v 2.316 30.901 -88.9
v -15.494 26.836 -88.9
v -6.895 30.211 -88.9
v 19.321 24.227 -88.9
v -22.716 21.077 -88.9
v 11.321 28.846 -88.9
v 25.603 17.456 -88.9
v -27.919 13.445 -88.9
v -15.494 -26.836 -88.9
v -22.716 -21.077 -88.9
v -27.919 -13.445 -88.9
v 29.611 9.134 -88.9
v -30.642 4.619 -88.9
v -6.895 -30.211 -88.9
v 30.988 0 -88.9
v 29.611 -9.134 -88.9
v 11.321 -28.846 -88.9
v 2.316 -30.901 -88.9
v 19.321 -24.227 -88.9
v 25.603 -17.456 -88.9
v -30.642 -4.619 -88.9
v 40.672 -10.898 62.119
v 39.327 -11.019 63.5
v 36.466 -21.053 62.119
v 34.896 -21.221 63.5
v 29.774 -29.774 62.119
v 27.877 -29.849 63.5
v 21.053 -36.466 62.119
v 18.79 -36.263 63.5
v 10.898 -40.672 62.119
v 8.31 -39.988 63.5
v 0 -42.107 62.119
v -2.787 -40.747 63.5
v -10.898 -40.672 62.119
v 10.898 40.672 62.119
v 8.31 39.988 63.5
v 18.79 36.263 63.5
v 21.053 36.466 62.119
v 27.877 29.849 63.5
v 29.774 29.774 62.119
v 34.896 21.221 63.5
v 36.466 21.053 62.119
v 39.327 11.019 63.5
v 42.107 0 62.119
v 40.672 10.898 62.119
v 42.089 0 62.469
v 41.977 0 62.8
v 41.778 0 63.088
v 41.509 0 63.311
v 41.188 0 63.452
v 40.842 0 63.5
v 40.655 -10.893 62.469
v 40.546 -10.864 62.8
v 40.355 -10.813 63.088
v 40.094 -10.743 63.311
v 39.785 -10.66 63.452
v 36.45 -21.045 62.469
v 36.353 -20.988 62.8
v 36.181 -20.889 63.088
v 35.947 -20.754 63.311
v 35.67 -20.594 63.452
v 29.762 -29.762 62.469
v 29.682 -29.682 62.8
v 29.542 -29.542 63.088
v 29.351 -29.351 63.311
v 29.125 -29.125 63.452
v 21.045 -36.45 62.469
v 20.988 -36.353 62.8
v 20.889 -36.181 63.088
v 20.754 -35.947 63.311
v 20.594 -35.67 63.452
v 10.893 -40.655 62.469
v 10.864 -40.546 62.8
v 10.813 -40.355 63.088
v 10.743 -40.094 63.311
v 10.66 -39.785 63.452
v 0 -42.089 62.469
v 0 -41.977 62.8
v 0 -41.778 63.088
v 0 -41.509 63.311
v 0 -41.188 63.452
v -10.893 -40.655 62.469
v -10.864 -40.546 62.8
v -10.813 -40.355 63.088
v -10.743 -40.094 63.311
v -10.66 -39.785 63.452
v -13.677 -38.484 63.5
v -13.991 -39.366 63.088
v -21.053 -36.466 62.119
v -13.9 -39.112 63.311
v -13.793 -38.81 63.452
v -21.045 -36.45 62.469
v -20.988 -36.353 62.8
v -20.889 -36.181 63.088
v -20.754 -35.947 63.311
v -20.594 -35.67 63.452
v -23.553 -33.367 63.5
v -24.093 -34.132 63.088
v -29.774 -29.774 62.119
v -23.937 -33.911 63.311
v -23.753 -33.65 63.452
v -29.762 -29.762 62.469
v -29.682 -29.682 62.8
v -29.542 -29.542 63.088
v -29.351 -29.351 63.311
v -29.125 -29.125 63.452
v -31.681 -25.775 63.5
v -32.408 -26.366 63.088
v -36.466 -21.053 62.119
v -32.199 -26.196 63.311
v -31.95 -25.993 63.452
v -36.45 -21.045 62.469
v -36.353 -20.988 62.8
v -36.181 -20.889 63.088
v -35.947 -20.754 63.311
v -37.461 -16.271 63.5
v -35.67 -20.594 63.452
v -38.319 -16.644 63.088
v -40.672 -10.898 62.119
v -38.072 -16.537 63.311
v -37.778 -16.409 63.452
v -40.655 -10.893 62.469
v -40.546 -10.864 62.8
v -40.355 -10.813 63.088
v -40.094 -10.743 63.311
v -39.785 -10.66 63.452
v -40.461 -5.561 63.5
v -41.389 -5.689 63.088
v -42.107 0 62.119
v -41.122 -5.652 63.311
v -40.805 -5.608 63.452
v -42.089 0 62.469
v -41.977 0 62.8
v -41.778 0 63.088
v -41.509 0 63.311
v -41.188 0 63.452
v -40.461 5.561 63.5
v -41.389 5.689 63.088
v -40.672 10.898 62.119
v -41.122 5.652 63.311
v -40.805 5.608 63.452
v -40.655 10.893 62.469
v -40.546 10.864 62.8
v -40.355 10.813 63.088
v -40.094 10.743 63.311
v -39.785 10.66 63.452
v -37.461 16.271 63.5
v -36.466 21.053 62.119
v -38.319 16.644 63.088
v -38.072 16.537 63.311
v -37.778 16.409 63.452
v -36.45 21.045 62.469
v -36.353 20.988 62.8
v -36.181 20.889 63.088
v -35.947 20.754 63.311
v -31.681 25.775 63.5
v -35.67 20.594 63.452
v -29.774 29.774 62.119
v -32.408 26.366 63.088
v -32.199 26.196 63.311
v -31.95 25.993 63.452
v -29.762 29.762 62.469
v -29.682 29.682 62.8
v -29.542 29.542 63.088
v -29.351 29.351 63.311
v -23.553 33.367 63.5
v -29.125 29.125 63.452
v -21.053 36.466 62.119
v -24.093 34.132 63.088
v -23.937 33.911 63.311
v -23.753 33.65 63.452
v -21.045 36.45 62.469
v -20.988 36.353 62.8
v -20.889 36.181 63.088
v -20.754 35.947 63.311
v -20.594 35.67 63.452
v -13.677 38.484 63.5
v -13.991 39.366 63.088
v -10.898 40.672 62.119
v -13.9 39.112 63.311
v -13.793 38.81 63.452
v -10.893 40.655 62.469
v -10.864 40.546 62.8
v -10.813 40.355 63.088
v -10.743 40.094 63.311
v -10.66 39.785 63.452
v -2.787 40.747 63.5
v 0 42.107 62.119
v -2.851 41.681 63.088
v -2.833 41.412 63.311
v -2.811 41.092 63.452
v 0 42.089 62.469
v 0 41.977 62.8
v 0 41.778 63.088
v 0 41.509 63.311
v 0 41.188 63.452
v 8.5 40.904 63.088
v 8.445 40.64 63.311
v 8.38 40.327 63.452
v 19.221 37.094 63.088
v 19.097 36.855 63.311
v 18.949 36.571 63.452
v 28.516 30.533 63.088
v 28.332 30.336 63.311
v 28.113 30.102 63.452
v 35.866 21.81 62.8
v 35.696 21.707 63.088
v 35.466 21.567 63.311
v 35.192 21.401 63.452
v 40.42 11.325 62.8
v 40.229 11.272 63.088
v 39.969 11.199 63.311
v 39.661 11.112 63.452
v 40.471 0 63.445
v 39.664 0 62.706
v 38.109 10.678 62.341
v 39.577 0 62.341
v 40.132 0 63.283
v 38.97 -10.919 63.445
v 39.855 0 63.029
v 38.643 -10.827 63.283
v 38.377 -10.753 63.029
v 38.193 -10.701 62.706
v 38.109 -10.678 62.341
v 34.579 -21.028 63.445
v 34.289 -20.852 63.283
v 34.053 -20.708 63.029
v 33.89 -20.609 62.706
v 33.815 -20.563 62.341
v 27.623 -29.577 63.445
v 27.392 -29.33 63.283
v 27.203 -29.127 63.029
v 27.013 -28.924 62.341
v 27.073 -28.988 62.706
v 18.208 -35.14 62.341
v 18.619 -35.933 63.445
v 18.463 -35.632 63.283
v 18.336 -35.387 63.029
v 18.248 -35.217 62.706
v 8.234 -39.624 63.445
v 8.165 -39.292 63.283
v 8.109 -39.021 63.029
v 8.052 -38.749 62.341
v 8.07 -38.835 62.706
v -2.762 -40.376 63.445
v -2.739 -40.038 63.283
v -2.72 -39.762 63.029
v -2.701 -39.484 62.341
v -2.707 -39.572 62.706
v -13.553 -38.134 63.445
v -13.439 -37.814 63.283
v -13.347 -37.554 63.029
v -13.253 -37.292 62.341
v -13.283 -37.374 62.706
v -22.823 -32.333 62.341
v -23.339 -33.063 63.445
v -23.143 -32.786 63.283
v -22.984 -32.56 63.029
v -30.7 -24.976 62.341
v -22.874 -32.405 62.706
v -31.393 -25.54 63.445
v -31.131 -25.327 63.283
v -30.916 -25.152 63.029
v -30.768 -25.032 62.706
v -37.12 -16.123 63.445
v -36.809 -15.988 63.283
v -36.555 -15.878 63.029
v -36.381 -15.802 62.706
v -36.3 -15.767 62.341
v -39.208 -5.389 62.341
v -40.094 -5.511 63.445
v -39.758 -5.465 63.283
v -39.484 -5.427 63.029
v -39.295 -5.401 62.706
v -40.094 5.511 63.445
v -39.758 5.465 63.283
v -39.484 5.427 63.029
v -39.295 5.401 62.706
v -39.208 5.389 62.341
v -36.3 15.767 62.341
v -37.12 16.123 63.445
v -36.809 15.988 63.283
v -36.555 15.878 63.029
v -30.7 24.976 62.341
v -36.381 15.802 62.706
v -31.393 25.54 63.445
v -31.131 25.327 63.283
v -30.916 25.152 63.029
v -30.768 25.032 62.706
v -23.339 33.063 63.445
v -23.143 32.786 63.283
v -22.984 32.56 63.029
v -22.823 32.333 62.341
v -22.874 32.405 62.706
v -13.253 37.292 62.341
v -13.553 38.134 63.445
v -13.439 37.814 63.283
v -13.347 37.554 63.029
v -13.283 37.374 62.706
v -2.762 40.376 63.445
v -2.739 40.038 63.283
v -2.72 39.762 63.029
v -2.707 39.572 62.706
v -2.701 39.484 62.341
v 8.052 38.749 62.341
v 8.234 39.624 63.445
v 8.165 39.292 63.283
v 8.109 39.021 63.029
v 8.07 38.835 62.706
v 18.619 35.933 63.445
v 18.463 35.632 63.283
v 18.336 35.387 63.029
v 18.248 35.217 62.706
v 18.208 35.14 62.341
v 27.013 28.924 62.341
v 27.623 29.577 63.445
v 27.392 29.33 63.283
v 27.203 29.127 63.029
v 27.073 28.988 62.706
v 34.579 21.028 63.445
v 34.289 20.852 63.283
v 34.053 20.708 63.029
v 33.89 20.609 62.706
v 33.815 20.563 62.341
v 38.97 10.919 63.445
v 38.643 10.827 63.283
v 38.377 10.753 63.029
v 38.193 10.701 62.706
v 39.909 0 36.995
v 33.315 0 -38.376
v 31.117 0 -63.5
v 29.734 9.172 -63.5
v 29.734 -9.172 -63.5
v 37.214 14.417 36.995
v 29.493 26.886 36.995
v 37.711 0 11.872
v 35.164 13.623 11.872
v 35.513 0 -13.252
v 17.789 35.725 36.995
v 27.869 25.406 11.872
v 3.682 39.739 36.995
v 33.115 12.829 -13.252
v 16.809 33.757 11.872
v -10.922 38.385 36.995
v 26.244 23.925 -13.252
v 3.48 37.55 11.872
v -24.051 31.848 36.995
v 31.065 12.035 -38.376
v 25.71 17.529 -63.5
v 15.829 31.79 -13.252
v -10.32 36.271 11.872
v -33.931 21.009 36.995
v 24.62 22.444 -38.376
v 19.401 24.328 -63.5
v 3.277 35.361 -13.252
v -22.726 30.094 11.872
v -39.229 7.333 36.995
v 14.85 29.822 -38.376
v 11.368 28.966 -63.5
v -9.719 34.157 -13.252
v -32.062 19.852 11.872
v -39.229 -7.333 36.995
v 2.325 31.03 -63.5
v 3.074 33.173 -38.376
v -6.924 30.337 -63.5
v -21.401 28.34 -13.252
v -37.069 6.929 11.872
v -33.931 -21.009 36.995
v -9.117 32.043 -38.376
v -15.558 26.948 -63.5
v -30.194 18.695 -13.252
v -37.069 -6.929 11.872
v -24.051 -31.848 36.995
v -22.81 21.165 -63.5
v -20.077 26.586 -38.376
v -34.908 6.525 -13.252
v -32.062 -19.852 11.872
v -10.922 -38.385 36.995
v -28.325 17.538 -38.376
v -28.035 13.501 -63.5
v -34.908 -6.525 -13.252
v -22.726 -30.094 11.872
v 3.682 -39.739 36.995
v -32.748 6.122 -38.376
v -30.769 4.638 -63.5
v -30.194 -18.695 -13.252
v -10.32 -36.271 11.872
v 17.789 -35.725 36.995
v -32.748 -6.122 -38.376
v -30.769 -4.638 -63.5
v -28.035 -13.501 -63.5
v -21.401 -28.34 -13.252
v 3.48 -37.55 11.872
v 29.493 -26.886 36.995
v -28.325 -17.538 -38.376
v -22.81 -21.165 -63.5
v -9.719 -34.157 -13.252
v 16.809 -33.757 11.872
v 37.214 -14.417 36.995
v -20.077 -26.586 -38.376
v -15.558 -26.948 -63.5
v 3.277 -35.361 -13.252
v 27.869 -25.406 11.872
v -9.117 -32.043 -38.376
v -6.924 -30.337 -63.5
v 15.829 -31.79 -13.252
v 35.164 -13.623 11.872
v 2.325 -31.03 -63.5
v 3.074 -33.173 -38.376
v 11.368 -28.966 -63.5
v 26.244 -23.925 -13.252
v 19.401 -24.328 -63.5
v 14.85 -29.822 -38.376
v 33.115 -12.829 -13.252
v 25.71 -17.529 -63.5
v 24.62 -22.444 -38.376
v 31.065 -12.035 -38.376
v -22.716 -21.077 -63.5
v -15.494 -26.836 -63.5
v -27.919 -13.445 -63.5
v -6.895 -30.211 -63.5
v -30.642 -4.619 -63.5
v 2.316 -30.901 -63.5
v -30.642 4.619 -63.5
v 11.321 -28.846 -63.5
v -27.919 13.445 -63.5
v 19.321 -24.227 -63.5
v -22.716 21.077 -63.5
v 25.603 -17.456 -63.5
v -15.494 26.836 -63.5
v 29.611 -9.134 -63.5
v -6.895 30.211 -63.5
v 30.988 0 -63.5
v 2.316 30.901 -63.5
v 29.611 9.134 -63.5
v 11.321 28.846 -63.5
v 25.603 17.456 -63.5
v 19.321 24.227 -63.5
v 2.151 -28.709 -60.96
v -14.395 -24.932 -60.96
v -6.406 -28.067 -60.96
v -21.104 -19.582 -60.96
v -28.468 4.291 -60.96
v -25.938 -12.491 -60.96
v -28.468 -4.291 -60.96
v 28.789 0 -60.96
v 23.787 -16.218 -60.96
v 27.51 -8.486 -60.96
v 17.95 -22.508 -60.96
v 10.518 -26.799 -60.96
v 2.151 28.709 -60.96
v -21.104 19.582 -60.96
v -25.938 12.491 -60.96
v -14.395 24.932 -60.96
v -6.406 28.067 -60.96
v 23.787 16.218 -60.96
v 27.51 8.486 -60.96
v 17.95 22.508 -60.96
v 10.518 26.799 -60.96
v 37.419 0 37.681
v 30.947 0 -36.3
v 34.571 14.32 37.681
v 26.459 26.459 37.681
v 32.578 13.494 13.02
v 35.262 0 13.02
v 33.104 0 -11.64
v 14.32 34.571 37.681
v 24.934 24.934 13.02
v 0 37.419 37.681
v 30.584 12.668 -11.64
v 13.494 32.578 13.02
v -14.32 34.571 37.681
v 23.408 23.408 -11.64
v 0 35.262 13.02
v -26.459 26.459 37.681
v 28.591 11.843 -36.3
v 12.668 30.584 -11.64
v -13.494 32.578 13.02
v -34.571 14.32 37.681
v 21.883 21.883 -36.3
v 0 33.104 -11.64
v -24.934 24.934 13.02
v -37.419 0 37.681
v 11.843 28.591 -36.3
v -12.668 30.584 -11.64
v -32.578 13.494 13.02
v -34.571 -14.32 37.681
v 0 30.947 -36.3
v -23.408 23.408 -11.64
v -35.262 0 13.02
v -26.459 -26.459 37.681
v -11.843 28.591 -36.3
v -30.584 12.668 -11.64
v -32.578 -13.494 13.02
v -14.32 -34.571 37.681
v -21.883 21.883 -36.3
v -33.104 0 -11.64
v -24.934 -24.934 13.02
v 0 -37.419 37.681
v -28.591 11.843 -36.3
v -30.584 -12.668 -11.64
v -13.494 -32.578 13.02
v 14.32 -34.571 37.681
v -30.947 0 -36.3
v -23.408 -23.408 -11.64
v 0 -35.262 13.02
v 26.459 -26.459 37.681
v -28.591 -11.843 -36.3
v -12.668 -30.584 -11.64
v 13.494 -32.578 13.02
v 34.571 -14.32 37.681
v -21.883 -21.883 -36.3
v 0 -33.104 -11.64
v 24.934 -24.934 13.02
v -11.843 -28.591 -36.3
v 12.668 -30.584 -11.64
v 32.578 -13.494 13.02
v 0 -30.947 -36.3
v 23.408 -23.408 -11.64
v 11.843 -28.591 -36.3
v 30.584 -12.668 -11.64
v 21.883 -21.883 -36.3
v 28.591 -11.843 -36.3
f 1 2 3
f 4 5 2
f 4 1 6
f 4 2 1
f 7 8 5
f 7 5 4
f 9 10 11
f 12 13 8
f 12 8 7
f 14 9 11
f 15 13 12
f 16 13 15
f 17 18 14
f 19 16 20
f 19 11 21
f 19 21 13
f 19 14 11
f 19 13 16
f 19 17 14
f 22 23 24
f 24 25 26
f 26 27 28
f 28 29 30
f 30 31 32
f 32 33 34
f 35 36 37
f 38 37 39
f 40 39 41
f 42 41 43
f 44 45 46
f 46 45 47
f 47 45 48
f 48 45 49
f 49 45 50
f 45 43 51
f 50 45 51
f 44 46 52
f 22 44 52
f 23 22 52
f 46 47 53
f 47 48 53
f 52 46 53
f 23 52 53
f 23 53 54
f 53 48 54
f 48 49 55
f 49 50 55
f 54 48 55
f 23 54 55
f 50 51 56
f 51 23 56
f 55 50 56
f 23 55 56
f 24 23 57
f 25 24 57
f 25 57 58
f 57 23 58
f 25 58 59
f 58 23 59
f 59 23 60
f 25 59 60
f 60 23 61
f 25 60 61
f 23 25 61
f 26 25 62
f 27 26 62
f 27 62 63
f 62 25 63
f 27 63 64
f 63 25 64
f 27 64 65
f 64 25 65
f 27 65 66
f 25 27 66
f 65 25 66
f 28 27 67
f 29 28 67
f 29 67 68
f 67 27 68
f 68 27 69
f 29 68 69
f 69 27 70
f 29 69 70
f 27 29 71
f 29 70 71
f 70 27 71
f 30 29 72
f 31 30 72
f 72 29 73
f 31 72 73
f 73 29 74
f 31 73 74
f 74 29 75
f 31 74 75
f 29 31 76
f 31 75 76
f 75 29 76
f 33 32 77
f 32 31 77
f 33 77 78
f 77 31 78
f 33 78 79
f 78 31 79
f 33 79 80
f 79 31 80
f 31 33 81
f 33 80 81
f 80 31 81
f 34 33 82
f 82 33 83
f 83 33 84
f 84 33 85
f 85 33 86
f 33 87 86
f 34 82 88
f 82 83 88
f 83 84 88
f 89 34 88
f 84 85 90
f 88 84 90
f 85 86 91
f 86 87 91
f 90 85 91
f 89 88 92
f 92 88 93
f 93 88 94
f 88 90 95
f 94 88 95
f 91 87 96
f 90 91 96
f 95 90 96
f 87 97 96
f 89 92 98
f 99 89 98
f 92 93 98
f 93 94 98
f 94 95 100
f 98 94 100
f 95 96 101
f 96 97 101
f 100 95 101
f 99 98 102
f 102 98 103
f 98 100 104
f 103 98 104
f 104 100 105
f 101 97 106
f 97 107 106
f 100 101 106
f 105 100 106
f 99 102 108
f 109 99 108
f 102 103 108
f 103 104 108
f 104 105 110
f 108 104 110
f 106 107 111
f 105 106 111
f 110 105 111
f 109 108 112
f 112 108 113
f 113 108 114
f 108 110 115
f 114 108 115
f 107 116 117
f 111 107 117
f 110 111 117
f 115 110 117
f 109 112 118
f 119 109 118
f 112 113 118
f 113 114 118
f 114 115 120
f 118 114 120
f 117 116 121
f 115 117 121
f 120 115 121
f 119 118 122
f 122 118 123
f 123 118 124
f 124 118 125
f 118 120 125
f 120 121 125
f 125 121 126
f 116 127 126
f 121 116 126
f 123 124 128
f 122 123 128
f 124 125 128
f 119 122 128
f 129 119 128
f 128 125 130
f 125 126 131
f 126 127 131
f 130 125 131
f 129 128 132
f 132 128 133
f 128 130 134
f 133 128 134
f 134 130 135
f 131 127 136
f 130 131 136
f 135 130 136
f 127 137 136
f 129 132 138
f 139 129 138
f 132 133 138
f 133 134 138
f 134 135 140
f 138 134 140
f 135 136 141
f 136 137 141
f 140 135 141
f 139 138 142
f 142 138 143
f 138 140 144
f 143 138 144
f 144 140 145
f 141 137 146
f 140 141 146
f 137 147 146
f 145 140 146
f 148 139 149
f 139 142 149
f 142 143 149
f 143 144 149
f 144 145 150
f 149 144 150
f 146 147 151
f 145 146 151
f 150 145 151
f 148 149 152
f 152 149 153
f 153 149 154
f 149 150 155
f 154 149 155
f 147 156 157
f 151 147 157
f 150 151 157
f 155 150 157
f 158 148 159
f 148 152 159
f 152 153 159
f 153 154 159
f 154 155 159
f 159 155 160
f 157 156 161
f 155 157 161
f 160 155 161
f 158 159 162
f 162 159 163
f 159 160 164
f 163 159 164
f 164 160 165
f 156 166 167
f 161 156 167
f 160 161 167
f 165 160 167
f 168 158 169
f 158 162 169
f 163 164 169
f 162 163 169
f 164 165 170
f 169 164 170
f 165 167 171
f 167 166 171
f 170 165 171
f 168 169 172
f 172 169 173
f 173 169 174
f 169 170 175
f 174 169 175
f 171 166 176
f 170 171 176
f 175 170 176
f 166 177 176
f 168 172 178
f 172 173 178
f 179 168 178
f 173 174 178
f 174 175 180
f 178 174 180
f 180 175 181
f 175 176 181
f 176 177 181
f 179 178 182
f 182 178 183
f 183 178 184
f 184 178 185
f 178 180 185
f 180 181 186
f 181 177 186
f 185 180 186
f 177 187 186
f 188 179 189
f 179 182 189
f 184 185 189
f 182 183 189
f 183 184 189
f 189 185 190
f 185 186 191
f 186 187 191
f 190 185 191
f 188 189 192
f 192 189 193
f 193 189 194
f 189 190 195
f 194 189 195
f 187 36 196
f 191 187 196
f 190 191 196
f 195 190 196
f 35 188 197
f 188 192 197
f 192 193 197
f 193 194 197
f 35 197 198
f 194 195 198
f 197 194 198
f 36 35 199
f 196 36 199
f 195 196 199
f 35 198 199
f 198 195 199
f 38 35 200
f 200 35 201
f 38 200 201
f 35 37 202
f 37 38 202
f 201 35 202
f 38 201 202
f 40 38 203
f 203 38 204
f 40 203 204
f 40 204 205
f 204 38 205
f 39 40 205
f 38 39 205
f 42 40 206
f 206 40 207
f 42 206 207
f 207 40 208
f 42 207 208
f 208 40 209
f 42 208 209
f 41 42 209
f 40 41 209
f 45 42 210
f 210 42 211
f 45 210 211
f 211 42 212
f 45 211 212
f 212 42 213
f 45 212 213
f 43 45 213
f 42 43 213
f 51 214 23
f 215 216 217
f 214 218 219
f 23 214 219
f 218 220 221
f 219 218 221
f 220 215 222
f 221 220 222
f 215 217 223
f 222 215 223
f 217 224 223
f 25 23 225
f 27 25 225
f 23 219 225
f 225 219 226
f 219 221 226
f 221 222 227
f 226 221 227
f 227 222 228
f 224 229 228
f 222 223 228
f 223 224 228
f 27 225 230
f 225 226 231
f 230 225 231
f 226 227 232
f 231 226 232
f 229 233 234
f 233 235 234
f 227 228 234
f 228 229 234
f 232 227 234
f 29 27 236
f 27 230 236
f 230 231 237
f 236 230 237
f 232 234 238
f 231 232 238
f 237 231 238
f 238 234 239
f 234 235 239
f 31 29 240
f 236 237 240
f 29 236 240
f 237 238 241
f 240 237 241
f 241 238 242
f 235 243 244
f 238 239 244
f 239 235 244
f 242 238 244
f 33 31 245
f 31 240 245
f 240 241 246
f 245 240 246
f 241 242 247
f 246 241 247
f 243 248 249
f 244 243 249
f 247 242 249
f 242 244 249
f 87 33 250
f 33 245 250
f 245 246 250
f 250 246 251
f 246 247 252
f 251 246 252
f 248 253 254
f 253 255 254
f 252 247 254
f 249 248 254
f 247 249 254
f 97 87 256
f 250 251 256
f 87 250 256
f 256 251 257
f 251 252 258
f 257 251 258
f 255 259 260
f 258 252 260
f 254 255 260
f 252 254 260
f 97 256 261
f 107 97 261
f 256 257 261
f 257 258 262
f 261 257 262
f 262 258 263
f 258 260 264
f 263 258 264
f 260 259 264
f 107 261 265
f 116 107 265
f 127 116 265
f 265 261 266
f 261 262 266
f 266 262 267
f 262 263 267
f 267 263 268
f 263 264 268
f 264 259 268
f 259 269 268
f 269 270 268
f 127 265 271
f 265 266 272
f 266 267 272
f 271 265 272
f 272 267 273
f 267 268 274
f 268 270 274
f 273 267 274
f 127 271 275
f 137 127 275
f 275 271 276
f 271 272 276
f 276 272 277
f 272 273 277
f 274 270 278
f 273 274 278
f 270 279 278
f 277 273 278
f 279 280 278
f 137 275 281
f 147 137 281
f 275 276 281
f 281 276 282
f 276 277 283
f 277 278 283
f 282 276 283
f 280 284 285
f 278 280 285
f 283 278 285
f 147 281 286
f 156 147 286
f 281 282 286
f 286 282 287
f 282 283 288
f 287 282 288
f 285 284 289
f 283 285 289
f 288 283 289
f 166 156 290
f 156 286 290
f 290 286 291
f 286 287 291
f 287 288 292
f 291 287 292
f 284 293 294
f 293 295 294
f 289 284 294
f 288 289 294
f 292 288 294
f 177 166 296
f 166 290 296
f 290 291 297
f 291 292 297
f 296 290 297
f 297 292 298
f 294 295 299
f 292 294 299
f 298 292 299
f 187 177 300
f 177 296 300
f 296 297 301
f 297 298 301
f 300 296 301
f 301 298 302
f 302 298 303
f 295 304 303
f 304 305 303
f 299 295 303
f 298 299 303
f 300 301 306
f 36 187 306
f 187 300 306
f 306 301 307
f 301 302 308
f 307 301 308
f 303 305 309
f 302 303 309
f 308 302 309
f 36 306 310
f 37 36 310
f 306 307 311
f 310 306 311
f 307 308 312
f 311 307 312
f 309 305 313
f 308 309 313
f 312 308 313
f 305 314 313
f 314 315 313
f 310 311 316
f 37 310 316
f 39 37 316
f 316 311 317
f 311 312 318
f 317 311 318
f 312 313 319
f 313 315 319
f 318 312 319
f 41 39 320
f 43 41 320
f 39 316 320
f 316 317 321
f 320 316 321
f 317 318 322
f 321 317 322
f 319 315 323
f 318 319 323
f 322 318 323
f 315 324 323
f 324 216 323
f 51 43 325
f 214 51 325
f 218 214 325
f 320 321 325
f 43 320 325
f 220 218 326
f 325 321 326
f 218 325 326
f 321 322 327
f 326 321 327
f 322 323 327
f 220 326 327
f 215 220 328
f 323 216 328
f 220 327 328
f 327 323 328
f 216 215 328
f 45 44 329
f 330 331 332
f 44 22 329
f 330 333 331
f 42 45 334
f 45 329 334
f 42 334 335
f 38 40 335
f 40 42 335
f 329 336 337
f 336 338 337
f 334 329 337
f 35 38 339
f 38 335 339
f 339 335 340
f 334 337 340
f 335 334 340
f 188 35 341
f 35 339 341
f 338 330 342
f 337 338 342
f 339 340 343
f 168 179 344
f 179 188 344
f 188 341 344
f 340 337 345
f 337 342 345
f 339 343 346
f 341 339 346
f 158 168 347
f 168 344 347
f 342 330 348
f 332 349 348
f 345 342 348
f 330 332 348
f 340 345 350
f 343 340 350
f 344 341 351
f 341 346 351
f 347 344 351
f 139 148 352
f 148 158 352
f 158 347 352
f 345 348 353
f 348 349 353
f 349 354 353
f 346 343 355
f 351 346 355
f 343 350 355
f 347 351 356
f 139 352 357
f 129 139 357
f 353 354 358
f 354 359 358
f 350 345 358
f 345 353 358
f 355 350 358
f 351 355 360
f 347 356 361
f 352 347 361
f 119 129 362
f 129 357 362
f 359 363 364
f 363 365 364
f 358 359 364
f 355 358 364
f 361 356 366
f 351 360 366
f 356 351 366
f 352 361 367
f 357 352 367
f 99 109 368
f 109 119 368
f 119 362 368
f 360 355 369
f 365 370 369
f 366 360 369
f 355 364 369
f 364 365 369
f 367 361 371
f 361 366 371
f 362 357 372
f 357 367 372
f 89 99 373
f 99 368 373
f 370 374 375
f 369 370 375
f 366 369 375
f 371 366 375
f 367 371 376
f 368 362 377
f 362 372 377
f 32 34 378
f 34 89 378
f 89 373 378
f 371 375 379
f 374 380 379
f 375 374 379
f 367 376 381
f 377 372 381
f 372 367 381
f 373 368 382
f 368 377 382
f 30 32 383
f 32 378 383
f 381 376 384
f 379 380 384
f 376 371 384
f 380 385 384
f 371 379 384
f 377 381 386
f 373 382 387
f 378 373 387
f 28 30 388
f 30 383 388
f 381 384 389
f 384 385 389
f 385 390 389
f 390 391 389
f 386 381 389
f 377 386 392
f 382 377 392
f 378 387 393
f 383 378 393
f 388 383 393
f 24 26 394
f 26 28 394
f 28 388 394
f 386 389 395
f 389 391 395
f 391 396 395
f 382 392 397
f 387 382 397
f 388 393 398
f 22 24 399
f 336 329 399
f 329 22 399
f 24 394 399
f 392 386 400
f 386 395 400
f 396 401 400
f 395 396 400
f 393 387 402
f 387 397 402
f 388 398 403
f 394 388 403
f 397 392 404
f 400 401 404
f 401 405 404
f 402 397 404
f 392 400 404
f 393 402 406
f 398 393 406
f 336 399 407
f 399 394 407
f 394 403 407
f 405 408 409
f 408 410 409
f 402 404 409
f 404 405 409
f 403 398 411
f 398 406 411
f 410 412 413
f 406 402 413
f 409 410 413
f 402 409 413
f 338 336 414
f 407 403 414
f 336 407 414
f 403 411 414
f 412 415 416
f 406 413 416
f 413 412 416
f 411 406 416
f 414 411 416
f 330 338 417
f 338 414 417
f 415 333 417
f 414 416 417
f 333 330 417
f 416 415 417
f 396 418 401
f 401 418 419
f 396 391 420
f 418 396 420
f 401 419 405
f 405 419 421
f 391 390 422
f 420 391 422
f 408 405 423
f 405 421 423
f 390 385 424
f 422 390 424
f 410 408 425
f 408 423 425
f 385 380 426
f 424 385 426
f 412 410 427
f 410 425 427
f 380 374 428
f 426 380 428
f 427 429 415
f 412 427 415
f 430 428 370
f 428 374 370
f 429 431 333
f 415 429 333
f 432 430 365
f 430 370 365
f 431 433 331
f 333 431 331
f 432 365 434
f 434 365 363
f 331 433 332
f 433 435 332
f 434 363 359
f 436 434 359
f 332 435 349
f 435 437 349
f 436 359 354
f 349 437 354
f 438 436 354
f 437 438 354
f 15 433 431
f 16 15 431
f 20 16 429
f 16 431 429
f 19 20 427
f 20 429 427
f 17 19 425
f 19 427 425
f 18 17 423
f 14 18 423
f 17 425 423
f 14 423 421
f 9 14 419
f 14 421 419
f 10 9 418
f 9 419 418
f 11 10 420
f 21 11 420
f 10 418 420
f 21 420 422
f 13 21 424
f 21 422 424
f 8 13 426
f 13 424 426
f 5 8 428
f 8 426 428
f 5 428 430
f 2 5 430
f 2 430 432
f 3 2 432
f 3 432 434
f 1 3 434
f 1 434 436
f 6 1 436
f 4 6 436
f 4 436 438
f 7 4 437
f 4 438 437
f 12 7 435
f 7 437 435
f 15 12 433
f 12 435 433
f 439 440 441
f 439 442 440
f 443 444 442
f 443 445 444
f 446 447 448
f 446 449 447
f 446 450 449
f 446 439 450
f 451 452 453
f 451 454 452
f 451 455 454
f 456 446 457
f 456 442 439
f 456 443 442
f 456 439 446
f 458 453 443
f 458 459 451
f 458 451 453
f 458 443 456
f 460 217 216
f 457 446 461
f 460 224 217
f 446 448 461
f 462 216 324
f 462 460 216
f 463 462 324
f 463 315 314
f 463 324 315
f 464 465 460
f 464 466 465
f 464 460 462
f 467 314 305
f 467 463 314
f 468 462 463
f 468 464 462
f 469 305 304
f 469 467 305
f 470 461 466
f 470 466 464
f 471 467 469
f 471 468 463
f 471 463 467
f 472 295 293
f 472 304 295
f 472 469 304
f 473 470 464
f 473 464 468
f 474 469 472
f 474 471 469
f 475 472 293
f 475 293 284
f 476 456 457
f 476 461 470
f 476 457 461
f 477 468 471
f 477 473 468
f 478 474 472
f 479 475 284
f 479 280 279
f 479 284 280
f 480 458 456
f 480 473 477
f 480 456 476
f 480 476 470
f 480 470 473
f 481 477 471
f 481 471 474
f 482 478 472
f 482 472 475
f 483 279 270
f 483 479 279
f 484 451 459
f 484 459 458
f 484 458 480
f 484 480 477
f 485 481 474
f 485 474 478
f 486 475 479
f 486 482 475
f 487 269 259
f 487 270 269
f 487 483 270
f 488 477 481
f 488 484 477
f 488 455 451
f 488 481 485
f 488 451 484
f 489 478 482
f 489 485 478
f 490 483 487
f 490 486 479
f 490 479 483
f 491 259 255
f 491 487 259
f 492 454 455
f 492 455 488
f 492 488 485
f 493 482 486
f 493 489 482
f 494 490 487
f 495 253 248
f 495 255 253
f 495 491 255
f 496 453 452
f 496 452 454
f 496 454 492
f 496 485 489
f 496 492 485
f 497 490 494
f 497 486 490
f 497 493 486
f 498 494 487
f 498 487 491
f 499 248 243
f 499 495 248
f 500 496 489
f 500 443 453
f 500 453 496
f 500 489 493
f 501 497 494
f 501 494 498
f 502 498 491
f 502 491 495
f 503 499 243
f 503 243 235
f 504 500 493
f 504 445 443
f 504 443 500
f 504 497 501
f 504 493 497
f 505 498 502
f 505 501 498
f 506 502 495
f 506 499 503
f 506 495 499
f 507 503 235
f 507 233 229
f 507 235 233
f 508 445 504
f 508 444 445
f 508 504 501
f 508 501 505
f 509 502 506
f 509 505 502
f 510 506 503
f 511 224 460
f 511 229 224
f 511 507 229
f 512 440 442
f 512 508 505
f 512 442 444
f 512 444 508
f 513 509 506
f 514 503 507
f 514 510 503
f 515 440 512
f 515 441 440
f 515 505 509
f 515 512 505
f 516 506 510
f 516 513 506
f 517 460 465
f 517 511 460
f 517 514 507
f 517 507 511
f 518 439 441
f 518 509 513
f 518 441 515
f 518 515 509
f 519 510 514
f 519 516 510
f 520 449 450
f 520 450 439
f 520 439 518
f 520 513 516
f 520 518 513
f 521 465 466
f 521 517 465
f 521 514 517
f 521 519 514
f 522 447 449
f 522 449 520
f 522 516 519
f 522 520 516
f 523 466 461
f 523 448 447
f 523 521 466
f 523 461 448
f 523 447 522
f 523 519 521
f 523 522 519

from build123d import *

# Parameters (mm, degrees)
F0_R     = 44.45
F1_DEPTH = 63.5
F3_T     = -2.54
F4_R     = 1.26999
F5_R     = 30.988
F6_DEPTH = 25.4


# Not quite as in the source:
# - a fillet or chamfer that OpenCascade refuses, or shapes differently, is made with other operations: its cross-section is extruded or revolved along the edge and cut away or added
# - a fillet or chamfer is up to 0.001 mm smaller than in the source, because OpenCascade refuses the exact size


with BuildPart() as f1:
    # F0 (on Top) → F1 (new body, symmetric)
    with BuildSketch(Plane.XY):
        Circle(F0_R)
    extrude(amount=F1_DEPTH, both=True)

    # F2: chamfer of 152.4 x 13.3332723214 on 1 edges, made by hand

    # F2_s1 → F2_t2 (revolve, cut)
    with BuildSketch(Plane.XZ):
        Polygon((44.45, 88.9), (31.1167276786, -63.5), (44.45, -63.5), align=None)
    revolve(axis=Axis((0, 0, -63.5), (0, 0, 1)), mode=Mode.SUBTRACT)

    # F3
    f3_openings = [f1.faces().sort_by_distance(p)[0] for p in [
        (0, 0, 63.5),
    ]]
    offset(amount=F3_T, openings=f3_openings)

    # F4 (radius 1.27 in the source; OpenCascade refuses exactly that, so slightly less here)
    f4_edges = [f1.edges().sort_by_distance(p)[0] for p in [
        (-42.227788, 0, 63.5),
        (-39.678086, 0, 63.5),
    ]]
    fillet(f4_edges, radius=F4_R)

    # F5 (on face) → F6 (join)
    with BuildSketch(Plane(origin=(0, 0, -63.5), x_dir=(1, 0, 0), z_dir=(0, 0, -1))):
        Circle(F5_R)
    extrude(amount=F6_DEPTH)


solid = f1.part
